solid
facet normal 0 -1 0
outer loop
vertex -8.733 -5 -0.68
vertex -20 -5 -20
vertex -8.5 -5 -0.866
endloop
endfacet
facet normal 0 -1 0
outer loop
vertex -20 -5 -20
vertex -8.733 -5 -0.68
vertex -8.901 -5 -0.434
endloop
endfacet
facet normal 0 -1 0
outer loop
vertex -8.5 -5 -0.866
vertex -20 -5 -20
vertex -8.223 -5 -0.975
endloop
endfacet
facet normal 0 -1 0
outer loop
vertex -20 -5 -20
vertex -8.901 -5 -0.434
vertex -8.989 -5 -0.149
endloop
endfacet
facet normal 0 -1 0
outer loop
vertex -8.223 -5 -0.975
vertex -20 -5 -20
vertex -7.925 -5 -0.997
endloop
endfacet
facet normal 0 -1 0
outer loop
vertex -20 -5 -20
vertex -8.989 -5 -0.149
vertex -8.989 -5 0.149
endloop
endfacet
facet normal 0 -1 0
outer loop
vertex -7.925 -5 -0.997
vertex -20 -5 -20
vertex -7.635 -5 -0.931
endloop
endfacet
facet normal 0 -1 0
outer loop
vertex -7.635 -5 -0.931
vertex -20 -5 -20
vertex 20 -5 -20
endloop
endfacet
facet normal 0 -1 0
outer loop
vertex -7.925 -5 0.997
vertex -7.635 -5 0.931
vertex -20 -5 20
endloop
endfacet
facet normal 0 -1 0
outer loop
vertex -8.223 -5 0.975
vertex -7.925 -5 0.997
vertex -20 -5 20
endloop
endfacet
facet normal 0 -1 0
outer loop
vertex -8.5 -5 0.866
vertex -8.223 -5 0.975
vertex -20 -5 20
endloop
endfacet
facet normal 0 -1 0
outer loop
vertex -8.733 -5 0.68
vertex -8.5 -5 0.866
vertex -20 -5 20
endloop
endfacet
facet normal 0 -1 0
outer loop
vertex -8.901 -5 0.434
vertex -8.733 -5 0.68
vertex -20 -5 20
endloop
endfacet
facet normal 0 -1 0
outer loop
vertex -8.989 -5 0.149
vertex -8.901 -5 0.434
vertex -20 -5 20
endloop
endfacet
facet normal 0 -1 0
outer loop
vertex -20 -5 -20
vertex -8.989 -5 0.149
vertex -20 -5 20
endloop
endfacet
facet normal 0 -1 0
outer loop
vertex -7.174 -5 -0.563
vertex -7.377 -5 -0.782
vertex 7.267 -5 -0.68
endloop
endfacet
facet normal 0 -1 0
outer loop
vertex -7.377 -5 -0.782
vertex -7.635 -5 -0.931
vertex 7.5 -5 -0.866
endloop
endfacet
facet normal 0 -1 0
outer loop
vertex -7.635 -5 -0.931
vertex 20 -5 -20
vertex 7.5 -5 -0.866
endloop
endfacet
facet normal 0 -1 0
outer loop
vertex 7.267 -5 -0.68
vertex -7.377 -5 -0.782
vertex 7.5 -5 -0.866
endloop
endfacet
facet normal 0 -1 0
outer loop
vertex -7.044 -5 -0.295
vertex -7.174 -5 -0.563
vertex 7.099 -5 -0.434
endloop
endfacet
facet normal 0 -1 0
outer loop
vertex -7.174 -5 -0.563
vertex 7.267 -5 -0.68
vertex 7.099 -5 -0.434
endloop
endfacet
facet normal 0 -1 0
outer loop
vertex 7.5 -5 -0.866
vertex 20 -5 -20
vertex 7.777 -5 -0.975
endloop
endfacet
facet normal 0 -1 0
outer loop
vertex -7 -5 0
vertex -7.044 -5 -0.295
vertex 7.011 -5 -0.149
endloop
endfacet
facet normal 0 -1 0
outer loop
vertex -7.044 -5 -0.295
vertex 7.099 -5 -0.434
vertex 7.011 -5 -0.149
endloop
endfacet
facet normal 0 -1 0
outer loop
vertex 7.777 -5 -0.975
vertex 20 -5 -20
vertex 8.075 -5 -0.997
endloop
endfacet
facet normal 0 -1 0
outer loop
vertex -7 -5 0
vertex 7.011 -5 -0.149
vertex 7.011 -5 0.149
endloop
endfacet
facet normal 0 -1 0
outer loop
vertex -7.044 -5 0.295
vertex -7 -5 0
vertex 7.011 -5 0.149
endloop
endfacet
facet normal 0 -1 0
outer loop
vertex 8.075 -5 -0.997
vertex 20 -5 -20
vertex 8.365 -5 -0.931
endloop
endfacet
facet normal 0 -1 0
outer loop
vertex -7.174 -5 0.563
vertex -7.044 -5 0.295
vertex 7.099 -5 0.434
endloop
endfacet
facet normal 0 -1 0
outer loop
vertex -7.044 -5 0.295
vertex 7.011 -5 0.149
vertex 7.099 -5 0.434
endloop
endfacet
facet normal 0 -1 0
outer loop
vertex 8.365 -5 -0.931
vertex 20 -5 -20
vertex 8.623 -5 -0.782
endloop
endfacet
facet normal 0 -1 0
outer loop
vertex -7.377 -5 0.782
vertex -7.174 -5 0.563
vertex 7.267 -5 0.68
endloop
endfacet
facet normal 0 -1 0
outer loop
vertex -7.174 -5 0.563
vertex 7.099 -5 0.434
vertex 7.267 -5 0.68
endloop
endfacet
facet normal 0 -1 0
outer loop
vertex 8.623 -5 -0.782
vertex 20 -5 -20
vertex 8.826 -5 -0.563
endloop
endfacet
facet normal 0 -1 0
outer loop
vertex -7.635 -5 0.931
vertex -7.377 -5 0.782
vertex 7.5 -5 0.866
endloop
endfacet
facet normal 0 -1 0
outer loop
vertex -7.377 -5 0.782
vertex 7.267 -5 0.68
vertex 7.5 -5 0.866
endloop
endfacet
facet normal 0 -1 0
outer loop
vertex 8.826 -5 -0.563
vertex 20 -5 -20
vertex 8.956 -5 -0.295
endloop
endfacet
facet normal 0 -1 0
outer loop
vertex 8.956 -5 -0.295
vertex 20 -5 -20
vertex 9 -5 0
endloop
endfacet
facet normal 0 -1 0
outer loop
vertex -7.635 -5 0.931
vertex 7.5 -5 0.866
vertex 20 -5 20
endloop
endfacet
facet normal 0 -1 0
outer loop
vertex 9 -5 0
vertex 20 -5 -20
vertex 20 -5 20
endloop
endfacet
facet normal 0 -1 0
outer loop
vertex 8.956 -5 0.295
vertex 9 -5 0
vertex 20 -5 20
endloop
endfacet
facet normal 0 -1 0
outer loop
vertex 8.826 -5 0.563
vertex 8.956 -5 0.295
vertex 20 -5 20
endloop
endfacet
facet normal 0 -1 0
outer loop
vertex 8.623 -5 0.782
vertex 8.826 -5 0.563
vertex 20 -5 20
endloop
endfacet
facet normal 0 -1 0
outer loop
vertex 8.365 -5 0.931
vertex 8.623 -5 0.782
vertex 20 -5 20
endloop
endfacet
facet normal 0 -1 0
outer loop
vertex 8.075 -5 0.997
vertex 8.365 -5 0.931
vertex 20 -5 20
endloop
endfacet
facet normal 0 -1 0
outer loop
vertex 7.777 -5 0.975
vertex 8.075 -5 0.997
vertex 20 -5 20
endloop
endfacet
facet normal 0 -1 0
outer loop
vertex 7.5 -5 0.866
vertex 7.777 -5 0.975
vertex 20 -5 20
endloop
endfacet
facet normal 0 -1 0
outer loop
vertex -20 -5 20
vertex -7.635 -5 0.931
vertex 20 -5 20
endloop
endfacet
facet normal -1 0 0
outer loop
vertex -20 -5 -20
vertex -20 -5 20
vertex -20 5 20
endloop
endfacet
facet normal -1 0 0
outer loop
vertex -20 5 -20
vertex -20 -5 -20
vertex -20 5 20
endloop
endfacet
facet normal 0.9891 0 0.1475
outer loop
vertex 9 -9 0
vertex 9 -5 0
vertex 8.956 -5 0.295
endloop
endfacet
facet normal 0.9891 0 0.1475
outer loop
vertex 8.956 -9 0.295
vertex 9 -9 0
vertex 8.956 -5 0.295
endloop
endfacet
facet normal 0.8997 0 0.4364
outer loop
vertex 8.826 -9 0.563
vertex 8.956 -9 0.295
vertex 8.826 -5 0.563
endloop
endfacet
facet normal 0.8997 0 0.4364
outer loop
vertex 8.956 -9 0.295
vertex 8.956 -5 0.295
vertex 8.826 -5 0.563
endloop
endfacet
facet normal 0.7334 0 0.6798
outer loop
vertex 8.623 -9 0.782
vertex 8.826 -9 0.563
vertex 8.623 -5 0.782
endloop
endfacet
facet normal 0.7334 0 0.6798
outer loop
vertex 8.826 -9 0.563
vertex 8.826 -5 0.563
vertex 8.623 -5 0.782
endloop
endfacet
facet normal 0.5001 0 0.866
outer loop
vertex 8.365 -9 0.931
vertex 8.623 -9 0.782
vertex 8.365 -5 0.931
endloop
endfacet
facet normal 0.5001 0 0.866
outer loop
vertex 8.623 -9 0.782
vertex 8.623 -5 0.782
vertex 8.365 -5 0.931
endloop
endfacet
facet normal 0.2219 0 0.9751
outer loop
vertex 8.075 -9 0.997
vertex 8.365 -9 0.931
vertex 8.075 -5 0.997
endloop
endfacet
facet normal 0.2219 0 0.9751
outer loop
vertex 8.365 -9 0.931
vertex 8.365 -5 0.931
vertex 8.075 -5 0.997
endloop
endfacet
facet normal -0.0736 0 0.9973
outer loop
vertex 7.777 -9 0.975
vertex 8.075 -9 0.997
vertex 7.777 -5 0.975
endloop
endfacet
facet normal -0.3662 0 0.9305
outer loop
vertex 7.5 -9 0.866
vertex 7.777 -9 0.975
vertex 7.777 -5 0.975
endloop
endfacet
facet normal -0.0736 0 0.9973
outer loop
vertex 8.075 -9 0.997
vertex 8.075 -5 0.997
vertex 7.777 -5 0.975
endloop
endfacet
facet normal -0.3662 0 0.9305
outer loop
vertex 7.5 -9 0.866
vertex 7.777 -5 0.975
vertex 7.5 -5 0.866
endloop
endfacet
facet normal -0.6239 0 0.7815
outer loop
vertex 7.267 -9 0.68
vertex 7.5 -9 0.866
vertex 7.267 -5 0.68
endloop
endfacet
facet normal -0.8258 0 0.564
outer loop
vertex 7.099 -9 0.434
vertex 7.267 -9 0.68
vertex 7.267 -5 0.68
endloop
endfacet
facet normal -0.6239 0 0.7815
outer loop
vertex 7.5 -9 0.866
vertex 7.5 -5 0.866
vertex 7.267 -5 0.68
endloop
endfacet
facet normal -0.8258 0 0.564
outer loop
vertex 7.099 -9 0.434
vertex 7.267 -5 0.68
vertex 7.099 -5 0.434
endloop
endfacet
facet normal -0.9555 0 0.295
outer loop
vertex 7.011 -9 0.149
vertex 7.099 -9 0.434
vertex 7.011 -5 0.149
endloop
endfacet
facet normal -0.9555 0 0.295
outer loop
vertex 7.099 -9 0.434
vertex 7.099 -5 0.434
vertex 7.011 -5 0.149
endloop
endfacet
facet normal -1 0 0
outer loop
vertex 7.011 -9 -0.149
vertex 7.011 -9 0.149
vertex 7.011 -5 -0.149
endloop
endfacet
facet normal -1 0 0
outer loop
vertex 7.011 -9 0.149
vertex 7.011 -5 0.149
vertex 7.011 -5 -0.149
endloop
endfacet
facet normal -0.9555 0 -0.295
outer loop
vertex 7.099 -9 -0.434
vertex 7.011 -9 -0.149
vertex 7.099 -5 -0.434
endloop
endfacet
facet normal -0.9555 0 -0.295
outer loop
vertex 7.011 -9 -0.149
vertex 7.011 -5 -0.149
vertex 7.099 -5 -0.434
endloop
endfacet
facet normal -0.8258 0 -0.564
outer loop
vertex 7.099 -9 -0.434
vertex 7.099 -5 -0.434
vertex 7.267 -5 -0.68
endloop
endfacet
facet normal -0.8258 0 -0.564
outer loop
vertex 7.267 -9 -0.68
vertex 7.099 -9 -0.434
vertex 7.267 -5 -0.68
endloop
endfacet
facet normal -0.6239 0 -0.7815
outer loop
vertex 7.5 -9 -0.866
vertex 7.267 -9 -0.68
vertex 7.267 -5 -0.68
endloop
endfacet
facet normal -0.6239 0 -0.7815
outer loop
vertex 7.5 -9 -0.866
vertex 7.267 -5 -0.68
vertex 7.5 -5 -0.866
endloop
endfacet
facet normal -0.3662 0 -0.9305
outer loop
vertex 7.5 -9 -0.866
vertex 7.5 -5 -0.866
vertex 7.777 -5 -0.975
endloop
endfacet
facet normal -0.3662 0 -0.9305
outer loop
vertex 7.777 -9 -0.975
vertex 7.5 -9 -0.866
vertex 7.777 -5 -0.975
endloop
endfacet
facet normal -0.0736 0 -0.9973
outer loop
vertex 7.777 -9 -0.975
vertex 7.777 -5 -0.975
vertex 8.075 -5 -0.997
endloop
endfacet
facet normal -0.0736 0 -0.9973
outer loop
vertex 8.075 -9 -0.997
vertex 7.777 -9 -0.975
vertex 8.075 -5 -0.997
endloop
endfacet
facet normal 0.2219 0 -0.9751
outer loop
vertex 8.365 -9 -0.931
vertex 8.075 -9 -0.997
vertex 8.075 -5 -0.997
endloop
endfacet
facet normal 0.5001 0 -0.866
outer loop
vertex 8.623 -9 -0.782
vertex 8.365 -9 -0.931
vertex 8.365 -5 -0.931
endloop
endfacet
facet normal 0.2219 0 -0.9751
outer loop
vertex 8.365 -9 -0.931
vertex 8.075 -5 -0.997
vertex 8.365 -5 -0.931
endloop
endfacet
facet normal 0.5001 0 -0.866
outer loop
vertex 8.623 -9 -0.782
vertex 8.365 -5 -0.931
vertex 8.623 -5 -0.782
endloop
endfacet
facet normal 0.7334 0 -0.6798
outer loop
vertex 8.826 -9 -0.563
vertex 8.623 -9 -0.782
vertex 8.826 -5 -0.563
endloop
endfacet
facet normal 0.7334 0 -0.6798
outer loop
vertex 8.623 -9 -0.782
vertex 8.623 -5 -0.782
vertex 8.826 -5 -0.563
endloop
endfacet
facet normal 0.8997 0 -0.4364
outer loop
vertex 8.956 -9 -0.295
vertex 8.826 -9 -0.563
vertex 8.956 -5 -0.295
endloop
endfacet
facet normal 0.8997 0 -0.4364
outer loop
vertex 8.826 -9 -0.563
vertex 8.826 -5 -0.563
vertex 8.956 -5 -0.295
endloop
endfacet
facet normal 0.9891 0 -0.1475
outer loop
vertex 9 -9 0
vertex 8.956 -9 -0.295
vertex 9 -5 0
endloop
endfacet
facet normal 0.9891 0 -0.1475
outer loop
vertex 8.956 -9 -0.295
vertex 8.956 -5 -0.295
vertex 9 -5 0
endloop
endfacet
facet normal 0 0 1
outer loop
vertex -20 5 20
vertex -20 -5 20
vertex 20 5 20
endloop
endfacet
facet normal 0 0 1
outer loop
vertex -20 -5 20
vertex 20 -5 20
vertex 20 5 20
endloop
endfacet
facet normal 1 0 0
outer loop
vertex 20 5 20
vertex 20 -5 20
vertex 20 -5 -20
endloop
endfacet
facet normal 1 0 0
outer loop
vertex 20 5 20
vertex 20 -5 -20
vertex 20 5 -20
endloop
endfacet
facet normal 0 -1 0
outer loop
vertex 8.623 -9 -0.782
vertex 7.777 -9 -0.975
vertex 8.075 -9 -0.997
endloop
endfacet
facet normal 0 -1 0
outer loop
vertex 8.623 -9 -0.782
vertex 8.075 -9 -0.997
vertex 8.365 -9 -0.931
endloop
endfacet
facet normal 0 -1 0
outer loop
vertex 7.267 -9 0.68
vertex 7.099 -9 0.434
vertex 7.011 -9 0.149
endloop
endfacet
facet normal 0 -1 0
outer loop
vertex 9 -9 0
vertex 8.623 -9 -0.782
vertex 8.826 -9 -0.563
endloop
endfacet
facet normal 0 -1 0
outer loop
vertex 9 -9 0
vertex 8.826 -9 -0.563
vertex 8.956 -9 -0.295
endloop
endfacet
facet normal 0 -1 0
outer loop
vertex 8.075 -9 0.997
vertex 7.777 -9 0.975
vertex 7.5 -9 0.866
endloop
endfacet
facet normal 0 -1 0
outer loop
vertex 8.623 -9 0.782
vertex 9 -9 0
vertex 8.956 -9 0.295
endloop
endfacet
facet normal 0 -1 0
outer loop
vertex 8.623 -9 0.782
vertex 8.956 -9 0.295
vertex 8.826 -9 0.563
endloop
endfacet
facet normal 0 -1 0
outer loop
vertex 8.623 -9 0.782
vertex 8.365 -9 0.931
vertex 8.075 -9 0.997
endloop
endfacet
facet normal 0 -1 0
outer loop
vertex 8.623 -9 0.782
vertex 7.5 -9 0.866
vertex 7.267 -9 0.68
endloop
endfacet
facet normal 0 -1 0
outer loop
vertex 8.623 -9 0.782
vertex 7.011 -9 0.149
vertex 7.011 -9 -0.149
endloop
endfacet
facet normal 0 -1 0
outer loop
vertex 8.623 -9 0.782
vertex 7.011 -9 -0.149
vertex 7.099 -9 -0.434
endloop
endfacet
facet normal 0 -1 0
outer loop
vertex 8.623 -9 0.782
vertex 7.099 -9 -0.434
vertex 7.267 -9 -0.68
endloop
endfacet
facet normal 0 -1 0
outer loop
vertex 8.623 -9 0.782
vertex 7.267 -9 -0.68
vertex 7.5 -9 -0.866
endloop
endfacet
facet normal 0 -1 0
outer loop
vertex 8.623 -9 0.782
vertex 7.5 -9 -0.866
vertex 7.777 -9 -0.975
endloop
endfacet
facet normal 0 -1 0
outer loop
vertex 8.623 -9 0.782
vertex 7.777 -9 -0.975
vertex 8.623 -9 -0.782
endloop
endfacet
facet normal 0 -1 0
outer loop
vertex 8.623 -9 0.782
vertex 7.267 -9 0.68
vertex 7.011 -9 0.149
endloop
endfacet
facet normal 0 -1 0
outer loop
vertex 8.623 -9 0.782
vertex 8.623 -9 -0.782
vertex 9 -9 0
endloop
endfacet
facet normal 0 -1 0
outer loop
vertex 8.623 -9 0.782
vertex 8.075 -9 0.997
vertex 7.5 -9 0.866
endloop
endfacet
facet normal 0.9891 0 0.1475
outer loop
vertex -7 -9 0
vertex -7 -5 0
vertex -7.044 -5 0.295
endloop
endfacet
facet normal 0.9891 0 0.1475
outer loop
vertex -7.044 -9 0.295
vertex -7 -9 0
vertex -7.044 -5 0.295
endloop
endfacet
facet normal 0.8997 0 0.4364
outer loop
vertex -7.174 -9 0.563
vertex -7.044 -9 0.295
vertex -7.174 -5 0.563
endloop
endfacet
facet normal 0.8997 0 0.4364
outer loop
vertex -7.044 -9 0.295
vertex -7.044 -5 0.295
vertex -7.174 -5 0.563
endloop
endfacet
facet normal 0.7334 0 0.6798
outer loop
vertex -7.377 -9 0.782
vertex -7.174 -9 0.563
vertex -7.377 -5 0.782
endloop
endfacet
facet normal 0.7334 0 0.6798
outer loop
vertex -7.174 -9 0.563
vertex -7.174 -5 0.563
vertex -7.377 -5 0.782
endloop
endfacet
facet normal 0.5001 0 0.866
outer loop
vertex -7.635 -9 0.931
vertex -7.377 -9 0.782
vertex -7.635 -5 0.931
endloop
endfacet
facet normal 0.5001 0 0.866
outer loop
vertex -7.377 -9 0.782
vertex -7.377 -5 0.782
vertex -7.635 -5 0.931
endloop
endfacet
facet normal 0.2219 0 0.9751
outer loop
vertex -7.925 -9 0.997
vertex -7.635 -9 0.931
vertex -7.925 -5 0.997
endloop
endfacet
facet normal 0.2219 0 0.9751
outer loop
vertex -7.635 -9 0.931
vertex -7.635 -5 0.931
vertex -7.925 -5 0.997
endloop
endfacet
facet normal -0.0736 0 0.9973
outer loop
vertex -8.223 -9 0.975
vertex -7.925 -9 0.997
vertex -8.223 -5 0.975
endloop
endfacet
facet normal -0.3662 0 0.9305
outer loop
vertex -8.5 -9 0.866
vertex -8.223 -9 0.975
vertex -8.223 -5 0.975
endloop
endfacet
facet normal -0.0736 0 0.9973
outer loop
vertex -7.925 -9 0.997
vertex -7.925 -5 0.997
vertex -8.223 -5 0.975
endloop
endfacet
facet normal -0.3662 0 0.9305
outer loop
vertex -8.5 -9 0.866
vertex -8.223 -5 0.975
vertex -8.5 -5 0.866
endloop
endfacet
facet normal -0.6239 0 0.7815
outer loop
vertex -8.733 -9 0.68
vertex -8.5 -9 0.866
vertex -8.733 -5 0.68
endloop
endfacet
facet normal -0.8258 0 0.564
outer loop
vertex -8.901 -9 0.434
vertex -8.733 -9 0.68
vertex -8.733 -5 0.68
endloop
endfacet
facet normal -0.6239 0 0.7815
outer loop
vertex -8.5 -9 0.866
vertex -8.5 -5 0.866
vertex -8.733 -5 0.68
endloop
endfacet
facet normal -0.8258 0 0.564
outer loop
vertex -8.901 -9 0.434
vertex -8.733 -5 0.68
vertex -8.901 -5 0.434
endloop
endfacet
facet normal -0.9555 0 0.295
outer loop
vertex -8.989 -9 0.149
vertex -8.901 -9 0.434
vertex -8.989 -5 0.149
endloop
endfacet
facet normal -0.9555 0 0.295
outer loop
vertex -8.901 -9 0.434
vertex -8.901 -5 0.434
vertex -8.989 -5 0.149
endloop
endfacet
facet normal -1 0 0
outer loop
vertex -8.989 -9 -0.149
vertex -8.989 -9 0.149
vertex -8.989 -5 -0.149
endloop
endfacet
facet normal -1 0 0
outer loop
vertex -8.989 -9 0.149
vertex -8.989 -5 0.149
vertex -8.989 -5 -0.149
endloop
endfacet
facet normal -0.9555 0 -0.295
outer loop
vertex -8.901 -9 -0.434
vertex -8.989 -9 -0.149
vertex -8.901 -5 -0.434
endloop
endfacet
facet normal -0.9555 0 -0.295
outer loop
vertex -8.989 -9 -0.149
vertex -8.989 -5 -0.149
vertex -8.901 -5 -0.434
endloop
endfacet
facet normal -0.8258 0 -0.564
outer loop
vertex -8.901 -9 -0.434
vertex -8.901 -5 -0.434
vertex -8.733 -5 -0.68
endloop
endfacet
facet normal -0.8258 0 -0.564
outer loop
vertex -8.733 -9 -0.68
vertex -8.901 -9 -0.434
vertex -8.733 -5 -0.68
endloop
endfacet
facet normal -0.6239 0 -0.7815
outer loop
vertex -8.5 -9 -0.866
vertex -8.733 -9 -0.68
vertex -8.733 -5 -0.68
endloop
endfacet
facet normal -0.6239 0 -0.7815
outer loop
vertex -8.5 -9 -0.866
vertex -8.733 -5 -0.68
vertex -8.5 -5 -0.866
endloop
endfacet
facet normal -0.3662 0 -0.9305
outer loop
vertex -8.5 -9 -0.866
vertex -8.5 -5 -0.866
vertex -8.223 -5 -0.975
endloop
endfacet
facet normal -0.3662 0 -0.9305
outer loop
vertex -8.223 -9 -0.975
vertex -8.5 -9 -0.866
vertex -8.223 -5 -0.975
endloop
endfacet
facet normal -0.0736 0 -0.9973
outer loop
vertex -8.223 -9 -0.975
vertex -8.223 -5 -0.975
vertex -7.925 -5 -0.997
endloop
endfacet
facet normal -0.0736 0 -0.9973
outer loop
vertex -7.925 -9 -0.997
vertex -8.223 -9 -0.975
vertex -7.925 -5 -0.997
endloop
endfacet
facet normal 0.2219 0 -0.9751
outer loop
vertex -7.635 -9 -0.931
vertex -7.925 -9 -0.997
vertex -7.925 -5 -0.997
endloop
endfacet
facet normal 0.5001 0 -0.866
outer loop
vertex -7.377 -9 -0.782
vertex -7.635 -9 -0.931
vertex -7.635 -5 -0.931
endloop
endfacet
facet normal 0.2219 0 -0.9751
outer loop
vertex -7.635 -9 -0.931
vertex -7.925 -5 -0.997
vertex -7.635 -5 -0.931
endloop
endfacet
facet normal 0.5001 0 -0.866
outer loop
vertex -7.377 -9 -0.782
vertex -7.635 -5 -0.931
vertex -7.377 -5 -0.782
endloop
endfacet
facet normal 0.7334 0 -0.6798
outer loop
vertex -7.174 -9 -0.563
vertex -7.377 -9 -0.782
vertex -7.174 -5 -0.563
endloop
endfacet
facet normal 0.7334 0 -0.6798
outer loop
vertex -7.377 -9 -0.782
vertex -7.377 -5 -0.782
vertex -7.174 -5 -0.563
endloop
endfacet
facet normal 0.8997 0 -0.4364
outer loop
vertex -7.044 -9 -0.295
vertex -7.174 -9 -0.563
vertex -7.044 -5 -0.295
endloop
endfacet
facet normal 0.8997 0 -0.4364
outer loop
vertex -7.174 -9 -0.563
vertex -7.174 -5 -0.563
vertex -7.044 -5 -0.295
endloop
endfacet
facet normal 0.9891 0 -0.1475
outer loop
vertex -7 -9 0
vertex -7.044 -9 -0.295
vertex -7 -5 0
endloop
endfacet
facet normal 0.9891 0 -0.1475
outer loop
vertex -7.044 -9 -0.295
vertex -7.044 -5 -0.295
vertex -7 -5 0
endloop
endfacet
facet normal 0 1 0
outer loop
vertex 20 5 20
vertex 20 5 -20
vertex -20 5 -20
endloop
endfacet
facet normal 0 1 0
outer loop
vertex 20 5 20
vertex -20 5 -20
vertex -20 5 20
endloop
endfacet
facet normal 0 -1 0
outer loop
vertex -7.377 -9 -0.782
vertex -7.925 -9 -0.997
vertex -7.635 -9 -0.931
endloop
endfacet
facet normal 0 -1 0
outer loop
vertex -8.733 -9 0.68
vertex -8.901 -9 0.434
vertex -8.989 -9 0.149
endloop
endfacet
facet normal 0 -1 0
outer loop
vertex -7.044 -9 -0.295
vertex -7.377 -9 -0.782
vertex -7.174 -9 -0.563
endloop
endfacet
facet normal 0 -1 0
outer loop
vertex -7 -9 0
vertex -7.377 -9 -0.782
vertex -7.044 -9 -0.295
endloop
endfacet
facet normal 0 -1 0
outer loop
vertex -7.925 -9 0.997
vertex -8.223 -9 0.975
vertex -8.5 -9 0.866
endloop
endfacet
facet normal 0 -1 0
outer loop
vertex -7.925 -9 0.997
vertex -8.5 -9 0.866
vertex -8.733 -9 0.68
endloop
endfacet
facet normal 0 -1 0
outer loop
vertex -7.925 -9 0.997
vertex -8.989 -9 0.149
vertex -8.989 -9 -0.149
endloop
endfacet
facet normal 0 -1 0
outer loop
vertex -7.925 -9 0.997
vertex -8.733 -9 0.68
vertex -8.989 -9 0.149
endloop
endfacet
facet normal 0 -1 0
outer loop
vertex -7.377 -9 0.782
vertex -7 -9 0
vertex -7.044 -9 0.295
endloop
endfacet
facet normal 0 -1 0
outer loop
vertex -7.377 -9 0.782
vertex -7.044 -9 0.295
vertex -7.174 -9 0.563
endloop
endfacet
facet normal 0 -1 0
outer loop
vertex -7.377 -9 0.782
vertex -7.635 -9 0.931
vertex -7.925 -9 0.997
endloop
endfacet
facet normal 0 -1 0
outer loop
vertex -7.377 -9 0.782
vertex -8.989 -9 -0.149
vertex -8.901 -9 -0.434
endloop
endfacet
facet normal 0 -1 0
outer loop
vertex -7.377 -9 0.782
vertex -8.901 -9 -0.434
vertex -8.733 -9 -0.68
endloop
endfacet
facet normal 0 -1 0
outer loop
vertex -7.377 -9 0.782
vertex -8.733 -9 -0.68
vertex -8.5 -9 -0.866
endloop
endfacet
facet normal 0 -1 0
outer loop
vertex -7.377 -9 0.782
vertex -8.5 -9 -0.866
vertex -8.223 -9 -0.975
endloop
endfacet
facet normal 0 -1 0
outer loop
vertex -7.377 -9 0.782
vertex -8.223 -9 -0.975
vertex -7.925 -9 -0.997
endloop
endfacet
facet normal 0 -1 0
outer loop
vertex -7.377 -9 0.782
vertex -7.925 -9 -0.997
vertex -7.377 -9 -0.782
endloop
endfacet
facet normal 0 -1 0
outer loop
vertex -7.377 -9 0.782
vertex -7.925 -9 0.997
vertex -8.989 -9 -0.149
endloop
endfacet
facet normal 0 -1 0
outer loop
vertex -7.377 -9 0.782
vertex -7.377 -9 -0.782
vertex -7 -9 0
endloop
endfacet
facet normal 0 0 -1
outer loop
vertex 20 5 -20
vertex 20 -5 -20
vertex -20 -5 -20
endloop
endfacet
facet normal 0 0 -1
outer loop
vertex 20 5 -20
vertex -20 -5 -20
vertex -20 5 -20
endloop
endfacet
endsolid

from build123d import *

# Parameters (mm, degrees)
F0_W          = 10
F0_H          = 40
F1_DEPTH      = 20
F1_DEPTH_BACK = 20
F2_R          = 1
F3_DEPTH      = 4


with BuildPart() as f1:
    # F0 (on Right) → F1 (new body, two sides)
    with BuildSketch(Plane.YZ) as f1_sk:
        Rectangle(F0_W, F0_H)
    extrude(amount=F1_DEPTH)
    extrude(f1_sk.sketch, amount=-F1_DEPTH_BACK)

    # F2 (on face) → F3 (join)
    with BuildSketch(Plane.XZ.offset(5)):
        with Locations((-8, 0)):
            Circle(F2_R)
        with Locations((8, 0)):
            Circle(F2_R)
    extrude(amount=F3_DEPTH)


solid = f1.part
